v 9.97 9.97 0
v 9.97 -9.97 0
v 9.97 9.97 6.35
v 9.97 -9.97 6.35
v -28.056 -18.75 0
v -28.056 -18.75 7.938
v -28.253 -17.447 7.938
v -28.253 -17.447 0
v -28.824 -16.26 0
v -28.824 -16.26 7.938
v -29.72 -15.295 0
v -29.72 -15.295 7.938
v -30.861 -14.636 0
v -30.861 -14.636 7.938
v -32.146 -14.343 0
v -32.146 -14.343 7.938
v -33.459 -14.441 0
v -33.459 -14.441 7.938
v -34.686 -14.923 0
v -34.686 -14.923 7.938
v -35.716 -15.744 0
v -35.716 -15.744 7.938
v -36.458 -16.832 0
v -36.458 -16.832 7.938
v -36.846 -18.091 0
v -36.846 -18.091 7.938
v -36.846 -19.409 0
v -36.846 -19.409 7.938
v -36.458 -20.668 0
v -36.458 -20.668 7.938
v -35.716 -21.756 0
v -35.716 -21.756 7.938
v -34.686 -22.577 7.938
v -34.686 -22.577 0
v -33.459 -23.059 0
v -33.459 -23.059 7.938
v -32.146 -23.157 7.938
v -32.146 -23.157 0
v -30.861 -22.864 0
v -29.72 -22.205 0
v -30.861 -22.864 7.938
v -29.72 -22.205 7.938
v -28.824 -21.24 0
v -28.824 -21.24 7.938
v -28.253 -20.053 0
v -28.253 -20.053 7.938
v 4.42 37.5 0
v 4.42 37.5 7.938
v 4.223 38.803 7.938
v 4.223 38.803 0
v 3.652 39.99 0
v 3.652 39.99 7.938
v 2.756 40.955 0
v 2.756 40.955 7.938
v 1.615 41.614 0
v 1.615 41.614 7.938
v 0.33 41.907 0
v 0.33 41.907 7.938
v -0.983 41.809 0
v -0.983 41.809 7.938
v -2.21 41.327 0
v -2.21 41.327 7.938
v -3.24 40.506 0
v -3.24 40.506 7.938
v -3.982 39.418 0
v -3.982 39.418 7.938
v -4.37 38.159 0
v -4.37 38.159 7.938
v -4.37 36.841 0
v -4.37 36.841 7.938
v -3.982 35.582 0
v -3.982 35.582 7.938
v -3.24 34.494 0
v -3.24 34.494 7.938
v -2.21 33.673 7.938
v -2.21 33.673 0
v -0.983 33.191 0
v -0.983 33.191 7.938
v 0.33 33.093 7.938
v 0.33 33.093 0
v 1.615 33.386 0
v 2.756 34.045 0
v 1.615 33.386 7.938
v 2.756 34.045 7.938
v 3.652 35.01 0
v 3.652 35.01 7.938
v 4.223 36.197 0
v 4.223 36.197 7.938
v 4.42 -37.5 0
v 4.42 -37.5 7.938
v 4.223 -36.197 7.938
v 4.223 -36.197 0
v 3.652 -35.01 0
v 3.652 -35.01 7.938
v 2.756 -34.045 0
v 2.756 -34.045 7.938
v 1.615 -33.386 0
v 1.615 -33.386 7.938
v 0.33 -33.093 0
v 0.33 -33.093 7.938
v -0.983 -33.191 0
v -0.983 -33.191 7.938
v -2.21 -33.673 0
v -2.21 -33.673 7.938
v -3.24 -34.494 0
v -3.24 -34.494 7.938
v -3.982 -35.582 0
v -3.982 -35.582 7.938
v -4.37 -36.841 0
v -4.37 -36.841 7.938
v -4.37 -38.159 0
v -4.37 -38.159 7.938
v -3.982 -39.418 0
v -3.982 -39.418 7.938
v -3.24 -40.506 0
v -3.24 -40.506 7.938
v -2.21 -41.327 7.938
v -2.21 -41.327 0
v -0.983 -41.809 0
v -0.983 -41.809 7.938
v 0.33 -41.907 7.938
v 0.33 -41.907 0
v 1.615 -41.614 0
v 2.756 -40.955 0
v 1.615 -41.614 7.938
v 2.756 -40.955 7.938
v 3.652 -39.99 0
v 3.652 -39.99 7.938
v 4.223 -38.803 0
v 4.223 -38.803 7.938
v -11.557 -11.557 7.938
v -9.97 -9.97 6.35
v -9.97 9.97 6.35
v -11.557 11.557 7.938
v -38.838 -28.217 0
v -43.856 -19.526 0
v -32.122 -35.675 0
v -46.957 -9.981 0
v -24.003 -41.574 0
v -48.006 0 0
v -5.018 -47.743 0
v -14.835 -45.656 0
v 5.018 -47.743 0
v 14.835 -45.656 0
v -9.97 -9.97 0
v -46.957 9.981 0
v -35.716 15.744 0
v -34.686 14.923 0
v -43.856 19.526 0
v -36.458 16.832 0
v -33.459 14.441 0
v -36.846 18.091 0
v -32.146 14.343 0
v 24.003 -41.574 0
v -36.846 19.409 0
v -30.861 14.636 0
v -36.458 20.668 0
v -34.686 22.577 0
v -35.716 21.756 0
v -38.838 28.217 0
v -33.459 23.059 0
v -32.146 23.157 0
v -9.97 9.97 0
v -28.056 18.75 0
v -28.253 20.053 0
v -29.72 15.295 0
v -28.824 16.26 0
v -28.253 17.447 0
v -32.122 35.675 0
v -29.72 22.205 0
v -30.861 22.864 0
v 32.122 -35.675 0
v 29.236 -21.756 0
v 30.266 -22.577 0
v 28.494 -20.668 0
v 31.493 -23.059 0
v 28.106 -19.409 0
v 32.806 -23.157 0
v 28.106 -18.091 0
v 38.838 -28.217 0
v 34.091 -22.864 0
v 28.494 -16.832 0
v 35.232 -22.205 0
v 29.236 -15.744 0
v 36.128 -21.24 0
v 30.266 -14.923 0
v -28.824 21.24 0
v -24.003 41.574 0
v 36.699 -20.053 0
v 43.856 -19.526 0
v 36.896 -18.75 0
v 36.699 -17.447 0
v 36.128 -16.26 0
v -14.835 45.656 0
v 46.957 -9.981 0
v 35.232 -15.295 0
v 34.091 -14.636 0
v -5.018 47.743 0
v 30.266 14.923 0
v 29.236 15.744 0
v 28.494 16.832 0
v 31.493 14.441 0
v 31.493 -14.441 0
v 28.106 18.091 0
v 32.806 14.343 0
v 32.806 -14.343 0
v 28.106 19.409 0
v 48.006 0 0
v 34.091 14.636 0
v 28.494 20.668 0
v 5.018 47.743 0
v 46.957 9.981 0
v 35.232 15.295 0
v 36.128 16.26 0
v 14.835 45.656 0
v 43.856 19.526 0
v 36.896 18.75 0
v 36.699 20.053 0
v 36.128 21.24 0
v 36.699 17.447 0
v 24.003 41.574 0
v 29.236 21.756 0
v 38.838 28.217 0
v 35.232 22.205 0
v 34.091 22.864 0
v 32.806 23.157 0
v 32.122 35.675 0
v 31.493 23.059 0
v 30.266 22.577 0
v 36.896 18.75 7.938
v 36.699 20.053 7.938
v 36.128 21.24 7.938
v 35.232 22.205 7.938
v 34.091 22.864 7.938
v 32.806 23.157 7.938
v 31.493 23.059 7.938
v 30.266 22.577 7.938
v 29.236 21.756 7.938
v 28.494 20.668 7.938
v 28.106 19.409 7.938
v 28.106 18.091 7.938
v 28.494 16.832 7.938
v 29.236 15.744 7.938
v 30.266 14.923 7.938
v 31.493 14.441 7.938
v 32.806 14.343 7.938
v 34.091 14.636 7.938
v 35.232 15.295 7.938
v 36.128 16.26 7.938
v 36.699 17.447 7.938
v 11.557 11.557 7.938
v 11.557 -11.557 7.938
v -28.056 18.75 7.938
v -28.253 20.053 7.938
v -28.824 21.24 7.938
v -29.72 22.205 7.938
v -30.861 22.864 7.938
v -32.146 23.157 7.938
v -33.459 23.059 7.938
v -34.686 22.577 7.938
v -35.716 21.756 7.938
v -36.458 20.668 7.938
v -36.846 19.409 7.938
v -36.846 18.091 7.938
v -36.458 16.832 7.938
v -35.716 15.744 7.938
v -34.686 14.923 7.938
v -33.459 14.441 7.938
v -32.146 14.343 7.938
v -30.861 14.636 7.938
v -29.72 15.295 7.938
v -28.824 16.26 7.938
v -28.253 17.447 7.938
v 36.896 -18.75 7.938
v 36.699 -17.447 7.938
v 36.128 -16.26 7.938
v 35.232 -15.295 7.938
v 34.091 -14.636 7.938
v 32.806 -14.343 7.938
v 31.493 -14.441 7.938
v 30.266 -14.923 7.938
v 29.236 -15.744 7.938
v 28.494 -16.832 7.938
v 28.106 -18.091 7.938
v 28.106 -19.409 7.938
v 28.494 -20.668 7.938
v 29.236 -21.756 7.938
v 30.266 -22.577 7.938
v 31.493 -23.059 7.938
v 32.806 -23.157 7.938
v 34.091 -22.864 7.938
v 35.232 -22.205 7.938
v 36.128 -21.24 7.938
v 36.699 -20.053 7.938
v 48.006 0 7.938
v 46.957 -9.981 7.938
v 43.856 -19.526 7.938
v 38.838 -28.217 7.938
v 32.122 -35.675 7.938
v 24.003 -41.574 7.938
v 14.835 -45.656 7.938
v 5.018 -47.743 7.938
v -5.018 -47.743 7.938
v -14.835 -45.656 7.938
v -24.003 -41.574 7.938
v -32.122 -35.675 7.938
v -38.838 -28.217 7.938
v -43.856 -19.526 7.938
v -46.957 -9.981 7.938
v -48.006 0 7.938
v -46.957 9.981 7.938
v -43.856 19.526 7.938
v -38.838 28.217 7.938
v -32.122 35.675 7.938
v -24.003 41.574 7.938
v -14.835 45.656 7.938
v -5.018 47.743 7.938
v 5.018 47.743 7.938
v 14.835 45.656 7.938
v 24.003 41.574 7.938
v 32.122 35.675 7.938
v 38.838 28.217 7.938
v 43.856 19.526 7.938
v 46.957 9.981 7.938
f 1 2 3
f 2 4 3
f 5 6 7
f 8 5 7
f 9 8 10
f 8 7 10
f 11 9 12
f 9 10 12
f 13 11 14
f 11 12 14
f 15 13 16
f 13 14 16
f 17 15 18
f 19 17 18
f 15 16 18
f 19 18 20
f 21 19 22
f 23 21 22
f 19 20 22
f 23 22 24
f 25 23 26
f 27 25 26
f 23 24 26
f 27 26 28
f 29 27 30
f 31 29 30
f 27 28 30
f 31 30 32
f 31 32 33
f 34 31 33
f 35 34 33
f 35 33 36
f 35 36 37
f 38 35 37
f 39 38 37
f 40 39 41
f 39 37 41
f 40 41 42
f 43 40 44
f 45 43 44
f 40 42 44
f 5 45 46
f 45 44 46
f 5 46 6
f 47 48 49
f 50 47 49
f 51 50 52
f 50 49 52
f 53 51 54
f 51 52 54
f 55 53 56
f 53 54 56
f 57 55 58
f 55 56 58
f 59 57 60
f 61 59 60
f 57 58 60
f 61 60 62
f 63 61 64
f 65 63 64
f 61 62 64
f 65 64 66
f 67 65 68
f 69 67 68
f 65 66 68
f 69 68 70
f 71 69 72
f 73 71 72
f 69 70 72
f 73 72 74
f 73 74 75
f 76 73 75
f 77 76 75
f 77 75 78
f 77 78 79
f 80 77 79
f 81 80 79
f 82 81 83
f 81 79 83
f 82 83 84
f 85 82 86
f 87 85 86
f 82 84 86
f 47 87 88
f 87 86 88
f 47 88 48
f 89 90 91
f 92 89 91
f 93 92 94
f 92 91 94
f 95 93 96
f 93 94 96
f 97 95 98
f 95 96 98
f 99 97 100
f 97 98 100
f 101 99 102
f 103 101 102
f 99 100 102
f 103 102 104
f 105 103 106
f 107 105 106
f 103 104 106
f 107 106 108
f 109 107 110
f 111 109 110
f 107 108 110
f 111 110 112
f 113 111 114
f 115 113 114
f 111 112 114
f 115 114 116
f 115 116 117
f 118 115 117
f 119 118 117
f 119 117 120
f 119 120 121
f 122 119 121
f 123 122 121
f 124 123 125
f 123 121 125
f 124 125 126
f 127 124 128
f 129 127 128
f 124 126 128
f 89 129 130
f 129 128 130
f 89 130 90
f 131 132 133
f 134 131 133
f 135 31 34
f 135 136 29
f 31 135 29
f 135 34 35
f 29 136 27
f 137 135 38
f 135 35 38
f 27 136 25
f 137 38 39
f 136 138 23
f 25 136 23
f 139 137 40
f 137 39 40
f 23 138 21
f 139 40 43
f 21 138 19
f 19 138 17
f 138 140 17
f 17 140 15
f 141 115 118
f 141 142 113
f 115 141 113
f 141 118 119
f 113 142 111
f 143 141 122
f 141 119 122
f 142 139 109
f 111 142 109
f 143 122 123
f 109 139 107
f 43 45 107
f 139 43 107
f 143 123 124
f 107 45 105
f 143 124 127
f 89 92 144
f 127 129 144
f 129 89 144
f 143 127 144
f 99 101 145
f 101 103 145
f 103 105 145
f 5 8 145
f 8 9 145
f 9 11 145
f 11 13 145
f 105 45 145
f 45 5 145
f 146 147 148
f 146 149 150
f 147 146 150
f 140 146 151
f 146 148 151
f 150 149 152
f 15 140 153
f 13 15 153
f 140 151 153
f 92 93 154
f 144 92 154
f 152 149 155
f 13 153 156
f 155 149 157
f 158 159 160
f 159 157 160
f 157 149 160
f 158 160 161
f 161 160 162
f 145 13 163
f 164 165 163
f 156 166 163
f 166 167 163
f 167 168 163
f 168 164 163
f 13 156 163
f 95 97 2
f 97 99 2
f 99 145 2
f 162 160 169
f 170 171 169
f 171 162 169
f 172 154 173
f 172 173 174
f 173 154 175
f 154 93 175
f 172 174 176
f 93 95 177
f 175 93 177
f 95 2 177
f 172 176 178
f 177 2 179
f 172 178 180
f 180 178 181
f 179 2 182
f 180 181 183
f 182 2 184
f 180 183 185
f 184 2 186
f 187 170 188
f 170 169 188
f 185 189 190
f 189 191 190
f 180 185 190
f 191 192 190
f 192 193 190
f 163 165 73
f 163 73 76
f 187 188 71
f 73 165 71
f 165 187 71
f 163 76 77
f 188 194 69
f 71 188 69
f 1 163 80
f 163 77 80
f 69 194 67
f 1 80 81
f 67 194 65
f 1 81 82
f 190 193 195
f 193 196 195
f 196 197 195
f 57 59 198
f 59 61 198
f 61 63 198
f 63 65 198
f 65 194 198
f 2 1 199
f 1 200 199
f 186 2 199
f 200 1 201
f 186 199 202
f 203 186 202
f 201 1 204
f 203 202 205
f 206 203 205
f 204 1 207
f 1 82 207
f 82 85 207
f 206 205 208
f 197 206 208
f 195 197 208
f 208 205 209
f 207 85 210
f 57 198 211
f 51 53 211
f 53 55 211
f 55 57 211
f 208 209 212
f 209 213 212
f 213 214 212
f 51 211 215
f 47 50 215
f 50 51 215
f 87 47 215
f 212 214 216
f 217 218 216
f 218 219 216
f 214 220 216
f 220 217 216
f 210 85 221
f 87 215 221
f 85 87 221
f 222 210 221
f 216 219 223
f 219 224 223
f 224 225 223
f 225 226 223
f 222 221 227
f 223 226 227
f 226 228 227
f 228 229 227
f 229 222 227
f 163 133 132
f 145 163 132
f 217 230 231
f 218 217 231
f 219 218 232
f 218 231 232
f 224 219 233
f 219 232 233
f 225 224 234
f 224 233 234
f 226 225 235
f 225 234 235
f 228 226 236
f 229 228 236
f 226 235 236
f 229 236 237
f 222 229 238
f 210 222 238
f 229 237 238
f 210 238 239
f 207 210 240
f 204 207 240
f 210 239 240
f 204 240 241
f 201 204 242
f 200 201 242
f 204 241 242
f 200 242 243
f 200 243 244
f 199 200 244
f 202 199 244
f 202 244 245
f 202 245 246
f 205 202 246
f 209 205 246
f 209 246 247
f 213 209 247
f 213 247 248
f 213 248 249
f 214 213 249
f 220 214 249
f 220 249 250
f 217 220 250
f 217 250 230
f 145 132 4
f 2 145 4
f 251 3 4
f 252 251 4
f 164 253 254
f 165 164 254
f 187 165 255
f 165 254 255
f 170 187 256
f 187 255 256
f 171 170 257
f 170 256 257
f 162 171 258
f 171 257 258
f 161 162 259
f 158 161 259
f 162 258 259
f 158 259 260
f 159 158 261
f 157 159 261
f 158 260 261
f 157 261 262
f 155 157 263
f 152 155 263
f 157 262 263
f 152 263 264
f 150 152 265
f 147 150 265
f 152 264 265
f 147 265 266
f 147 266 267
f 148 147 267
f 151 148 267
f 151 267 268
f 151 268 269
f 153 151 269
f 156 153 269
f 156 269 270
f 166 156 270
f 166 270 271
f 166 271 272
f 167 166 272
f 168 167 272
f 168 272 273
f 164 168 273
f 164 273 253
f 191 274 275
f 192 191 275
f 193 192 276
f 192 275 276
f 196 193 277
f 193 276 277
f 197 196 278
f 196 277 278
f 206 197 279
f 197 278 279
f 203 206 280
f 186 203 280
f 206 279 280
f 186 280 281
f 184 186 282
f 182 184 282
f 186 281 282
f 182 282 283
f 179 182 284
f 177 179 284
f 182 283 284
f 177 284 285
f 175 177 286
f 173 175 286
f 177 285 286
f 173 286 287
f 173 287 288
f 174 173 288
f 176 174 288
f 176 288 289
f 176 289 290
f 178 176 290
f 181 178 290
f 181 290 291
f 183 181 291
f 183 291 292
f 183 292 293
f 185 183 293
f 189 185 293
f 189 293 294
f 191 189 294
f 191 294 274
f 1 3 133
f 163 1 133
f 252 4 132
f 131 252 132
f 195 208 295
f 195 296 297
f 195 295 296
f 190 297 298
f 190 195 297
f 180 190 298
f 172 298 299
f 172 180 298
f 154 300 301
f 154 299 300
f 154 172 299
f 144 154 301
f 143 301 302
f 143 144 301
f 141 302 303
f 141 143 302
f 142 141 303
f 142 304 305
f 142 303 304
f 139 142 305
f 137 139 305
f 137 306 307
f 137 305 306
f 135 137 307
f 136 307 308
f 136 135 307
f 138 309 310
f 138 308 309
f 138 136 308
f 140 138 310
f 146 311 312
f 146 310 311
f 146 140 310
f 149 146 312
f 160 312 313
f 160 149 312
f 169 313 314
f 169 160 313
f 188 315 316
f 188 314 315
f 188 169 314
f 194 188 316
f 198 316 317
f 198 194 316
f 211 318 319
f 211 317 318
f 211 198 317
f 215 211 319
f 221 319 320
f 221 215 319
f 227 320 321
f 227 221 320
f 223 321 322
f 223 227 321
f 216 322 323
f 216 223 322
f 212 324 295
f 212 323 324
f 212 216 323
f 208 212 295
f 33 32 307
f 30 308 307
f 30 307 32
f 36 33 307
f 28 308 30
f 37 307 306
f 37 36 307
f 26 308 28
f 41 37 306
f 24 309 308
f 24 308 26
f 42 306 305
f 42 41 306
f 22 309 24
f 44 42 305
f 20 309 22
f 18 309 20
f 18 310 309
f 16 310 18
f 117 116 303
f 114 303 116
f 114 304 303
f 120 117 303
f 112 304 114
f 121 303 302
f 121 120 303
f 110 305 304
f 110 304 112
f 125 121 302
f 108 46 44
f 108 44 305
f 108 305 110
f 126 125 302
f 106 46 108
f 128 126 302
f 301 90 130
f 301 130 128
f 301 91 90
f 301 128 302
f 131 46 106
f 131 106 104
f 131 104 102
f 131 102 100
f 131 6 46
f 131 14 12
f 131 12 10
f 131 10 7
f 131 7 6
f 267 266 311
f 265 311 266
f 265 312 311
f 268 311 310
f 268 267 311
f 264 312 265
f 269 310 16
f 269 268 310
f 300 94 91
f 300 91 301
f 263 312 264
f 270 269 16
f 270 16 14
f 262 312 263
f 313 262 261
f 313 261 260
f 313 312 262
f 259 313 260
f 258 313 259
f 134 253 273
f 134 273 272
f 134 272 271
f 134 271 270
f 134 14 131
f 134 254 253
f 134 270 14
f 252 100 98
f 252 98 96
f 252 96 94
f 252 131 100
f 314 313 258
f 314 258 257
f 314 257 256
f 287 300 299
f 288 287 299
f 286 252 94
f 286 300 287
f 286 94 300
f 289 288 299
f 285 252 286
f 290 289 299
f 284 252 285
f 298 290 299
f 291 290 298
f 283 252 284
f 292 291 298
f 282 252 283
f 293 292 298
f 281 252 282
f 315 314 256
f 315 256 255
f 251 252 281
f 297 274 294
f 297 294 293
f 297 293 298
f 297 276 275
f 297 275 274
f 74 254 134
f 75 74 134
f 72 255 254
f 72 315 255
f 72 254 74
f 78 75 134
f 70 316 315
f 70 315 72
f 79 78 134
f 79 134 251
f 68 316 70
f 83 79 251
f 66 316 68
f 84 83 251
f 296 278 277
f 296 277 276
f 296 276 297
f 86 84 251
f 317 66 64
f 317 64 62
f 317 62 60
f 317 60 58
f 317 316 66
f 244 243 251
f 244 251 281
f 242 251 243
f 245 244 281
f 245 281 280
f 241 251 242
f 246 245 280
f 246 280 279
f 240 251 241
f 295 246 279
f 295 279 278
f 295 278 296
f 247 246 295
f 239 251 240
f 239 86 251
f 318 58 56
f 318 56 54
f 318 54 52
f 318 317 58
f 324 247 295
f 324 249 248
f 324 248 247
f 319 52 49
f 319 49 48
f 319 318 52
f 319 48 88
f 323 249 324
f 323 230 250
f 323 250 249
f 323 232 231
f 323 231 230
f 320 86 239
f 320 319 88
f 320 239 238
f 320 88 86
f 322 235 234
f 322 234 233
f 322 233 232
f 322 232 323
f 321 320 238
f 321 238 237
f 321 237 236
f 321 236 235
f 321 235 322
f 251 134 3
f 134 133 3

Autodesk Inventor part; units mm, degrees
ref_plane "YZ Plane" through (0, 0, 0) normal (1, 0, 0) x (0, 1, 0)
ref_plane "XZ Plane" through (0, 0, 0) normal (0, 1, 0) x (-1, 0, 0)
ref_plane "XY Plane" through (0, 0, 0) normal (0, 0, 1) x (1, 0, 0)
sketch "Sketch1" plane through (0, 0, 0) normal (0, 0, 1) x (1, 0, 0)
  circle A0 centre (0, 0) radius 48.006
  dimension "d0" = 96.012
extrude "Extrusion1" add sketch "Sketch1" along normal blind 7.9375
sketch "Sketch2" plane through (0, 0, 7.9375) normal (0, 0, 1) x (1, 0, 0)
  circle A0 centre (0, 37.5) radius 4.4196
  circle A1 centre (-32.476, 18.75) radius 4.4196
  circle A2 centre (-32.476, -18.75) radius 4.4196
  circle A3 centre (0, -37.5) radius 4.4196
  circle A4 centre (32.476, -18.75) radius 4.4196
  circle A5 centre (32.476, 18.75) radius 4.4196
  circle A6 centre (0, 0) radius 37.5
  dimension "d17" = 75
  dimension "d3" = 8.8392
  dimension "d7" = 360
extrude "Extrusion2" cut sketch "Sketch2" against normal through all contours A0 A6 | A6 A0 | A6 A1 | A1 A6 | A6 A5 | A5 A6 | A6 A2 | A2 A6 | A6 A4 | A4 A6 | A6 A3 | A3 A6
sketch "Sketch3" plane through (0, 0, 7.9375) normal (0, 0, 1) x (1, 0, 0)
  line L0 (-9.9695, -9.9695) -> (9.9695, -9.9695)
  line L1 (9.9695, -9.9695) -> (9.9695, 9.9695)
  line L2 (9.9695, 9.9695) -> (-9.9695, 9.9695)
  line L3 (-9.9695, 9.9695) -> (-9.9695, -9.9695)
  line L4 (-9.9695, -9.9695) -> (9.9695, 9.9695) construction
  line L5 (9.9695, -9.9695) -> (-9.9695, 9.9695) construction
  point P0 (0, 0)
  dimension "d11" = 19.939
extrude "Extrusion3" cut sketch "Sketch3" against normal through all
chamfer "Chamfer1" distance 1.5875 angle 45 4 edges at (0, 9.9695, 7.9375) (-9.9695, 0, 7.9375) (0, -9.9695, 7.9375) (9.9695, 0, 7.9375)
properties part number "Adam's Shaft plate rev 2"
